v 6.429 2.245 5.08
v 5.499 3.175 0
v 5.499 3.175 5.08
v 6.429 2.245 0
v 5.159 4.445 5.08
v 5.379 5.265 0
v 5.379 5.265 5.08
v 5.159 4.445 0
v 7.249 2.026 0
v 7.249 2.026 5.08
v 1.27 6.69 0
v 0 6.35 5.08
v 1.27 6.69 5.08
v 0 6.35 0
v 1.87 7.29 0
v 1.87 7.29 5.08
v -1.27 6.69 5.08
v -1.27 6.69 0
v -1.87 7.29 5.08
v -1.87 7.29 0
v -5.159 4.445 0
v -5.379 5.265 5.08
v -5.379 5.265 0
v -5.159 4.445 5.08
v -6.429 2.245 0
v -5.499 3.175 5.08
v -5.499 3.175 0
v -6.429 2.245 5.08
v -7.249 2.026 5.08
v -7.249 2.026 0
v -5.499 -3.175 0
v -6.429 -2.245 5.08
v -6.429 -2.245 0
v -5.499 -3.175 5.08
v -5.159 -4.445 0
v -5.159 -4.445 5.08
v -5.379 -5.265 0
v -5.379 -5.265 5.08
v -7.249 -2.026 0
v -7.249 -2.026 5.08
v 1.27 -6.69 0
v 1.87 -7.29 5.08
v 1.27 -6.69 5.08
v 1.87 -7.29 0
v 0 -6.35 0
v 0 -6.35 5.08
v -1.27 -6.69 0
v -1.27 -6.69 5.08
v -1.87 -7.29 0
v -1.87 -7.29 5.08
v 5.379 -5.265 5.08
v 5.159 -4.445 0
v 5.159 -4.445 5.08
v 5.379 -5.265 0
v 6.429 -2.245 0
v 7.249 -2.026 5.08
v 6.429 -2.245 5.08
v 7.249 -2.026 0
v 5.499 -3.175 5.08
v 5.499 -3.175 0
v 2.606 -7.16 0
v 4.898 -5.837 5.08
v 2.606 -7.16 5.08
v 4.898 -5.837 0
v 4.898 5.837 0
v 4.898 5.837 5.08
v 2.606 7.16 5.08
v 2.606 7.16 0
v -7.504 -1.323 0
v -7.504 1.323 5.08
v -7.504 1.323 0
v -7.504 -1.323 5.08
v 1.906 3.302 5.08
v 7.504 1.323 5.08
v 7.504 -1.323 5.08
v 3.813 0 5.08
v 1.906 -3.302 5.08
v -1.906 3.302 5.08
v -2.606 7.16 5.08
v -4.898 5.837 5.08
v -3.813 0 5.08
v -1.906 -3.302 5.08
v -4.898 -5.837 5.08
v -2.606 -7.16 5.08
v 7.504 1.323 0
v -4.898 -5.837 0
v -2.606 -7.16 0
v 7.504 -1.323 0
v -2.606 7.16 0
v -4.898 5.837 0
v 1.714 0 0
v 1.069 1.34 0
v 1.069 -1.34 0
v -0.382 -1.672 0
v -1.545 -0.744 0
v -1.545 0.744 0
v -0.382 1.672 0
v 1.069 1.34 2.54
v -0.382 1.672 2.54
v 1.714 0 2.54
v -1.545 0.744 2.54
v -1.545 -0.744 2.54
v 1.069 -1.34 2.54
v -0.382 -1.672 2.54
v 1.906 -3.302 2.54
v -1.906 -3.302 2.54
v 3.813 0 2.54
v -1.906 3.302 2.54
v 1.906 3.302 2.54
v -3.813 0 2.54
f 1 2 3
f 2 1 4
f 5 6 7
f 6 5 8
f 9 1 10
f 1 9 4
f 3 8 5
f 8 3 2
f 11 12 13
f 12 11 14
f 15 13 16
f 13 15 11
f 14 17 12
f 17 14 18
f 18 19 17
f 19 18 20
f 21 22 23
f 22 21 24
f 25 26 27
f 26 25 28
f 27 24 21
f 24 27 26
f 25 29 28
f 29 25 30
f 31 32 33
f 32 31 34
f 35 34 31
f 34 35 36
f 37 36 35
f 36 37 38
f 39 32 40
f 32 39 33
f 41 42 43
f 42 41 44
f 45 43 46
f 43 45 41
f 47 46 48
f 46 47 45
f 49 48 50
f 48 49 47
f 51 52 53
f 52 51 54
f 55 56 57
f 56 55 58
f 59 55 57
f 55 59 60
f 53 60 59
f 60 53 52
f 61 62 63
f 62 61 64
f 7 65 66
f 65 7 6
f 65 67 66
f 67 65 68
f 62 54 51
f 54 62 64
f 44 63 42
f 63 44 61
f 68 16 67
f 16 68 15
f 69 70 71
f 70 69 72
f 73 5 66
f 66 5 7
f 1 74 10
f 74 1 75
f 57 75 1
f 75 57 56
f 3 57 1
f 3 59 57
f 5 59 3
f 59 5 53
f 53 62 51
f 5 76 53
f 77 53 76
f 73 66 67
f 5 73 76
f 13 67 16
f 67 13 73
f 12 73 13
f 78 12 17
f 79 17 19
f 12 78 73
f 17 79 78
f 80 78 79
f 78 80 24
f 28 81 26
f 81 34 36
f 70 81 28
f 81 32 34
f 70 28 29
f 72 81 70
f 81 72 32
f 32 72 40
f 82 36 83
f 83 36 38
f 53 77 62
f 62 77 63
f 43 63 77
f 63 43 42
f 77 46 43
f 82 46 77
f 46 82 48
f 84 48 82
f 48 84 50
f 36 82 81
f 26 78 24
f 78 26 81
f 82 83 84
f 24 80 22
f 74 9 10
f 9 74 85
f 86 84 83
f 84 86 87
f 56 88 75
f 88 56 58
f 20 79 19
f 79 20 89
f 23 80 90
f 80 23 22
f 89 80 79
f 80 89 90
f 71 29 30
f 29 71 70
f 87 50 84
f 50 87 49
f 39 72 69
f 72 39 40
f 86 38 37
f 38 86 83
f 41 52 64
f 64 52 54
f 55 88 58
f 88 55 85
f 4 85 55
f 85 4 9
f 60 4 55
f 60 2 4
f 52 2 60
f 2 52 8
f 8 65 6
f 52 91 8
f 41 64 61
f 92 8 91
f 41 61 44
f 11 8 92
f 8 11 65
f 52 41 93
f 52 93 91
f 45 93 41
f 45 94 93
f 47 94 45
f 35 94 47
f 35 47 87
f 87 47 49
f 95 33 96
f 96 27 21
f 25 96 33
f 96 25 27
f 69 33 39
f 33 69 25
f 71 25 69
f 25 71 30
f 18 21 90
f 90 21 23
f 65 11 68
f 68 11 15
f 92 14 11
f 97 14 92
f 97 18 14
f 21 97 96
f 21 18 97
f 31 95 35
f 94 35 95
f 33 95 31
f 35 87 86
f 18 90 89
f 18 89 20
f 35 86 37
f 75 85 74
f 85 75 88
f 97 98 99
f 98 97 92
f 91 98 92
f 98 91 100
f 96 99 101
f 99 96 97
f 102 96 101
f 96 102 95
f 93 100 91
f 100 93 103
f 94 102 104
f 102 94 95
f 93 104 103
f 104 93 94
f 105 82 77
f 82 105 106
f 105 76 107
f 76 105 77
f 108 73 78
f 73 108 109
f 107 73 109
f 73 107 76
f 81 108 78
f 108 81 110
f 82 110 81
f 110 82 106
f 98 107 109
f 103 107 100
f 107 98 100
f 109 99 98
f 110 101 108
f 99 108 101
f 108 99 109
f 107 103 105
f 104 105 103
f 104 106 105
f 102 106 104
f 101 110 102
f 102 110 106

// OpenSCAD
// file: utils.scad
//
// general utility functions for OpenSCAD
//
function inch(in) = 25.4*in;
// main file
//
// thumbscrew cap for #6-32 nut (5/16 wrench)
//
use <utils.scad>;
epsilon = 1;

module thumbscrew(size = "#6-32", height = -1)
{

  epsilon = 1;
  major_diam_table = [["#4-40", inch(0.6)],
                      ["#6-32", inch(0.6)]];                      
  thumbscrew_knurl_diameter_table = [["#4-40", inch(0.7)],
                                     ["#6-32", inch(0.7)]];
  thumbscrew_knurl_size_table = [["#4-40", inch(0.1)],
                                 ["#6-32", inch(0.1)]];
  thumbscrew_num_knurls_table = [["#4-40", 6],
                                 ["#6-32", 6]];
  thumbscrew_height_table = [["#4-40", inch(0.2)],
                             ["#6-32", inch(0.2)]];
  thumbscrew_base_thickness_table = [["#4-40", inch(0.1)],
                                     ["#6-32", inch(0.075)]];
  thumbscrew_wrench_size_table = [["#4-40", inch(1/4)],
                                  ["#6-32", inch(5/16)]];
  thumbscrew_wrench_tol_table = [["#4-40", inch(0.01)],
                                 ["#6-32", inch(0.01)]];
  screw_clearance_diameter_table = [["#4-40", inch(0.135)],
                                    ["#6-32", inch(0.165)]];


  thumbscrew_diameter = 
    major_diam_table[search([size], major_diam_table)[0]][1];

  thumbscrew_knurl_diameter =
    thumbscrew_knurl_diameter_table[search([size],
                                           thumbscrew_knurl_diameter_table)[0]][1];

  thumbscrew_knurl_size = 
    thumbscrew_knurl_size_table[search([size],
                                       thumbscrew_knurl_size_table)[0]][1];
  thumbscrew_num_knurls =
    thumbscrew_num_knurls_table[search([size],
                                       thumbscrew_num_knurls_table)[0]][1];
  thumbscrew_height = (height > 0) ? height :
    thumbscrew_height_table[search([size],
                                   thumbscrew_height_table)[0]][1];
  thumbscrew_base_thickness =
    thumbscrew_base_thickness_table[search([size],
                                           thumbscrew_base_thickness_table)[0]][1];
  thumbscrew_wrench_size =
    thumbscrew_wrench_size_table[search([size],
                                        thumbscrew_wrench_size_table)[0]][1];
  thumbscrew_wrench_tol =
    thumbscrew_wrench_tol_table[search([size],
                                       thumbscrew_wrench_tol_table)[0]][1];
  screw_clearance_diameter = 
    screw_clearance_diameter_table[search([size],
                                          screw_clearance_diameter_table)[0]][1];

  // calculation based on hex-shaped nut
  thumbscrew_nut_diameter = (thumbscrew_wrench_size +
                             thumbscrew_wrench_tol) / cos(30);

  difference()
  {
    // main body
    rotate([0, 0, 180/thumbscrew_num_knurls])
    {
      cylinder($fn=thumbscrew_num_knurls*3,
               r=thumbscrew_diameter/2,
               h=thumbscrew_height);
    }
    // thru hole
    translate([0, 0, -epsilon])
    {
      cylinder($fn=max(3, round(2*screw_clearance_diameter)),
               r=screw_clearance_diameter/2, h=inch(1));
    }
    // nut recess
    translate([0, 0, thumbscrew_base_thickness])
    {
      cylinder($fn=6, r=thumbscrew_nut_diameter/2, h=inch(1));
    }
    for(i = [0 : thumbscrew_num_knurls-1])
    {
      translate([0.5*thumbscrew_knurl_diameter*
                 cos(30+360*i/thumbscrew_num_knurls),
                 0.5*thumbscrew_knurl_diameter*
                 sin(30+360*i/thumbscrew_num_knurls),
                 -epsilon])
      {
        cylinder($fn=thumbscrew_num_knurls*2,
                 r = thumbscrew_knurl_size, inch(1.0));
      }
    }
  }
}

thumbscrew("#4-40");
